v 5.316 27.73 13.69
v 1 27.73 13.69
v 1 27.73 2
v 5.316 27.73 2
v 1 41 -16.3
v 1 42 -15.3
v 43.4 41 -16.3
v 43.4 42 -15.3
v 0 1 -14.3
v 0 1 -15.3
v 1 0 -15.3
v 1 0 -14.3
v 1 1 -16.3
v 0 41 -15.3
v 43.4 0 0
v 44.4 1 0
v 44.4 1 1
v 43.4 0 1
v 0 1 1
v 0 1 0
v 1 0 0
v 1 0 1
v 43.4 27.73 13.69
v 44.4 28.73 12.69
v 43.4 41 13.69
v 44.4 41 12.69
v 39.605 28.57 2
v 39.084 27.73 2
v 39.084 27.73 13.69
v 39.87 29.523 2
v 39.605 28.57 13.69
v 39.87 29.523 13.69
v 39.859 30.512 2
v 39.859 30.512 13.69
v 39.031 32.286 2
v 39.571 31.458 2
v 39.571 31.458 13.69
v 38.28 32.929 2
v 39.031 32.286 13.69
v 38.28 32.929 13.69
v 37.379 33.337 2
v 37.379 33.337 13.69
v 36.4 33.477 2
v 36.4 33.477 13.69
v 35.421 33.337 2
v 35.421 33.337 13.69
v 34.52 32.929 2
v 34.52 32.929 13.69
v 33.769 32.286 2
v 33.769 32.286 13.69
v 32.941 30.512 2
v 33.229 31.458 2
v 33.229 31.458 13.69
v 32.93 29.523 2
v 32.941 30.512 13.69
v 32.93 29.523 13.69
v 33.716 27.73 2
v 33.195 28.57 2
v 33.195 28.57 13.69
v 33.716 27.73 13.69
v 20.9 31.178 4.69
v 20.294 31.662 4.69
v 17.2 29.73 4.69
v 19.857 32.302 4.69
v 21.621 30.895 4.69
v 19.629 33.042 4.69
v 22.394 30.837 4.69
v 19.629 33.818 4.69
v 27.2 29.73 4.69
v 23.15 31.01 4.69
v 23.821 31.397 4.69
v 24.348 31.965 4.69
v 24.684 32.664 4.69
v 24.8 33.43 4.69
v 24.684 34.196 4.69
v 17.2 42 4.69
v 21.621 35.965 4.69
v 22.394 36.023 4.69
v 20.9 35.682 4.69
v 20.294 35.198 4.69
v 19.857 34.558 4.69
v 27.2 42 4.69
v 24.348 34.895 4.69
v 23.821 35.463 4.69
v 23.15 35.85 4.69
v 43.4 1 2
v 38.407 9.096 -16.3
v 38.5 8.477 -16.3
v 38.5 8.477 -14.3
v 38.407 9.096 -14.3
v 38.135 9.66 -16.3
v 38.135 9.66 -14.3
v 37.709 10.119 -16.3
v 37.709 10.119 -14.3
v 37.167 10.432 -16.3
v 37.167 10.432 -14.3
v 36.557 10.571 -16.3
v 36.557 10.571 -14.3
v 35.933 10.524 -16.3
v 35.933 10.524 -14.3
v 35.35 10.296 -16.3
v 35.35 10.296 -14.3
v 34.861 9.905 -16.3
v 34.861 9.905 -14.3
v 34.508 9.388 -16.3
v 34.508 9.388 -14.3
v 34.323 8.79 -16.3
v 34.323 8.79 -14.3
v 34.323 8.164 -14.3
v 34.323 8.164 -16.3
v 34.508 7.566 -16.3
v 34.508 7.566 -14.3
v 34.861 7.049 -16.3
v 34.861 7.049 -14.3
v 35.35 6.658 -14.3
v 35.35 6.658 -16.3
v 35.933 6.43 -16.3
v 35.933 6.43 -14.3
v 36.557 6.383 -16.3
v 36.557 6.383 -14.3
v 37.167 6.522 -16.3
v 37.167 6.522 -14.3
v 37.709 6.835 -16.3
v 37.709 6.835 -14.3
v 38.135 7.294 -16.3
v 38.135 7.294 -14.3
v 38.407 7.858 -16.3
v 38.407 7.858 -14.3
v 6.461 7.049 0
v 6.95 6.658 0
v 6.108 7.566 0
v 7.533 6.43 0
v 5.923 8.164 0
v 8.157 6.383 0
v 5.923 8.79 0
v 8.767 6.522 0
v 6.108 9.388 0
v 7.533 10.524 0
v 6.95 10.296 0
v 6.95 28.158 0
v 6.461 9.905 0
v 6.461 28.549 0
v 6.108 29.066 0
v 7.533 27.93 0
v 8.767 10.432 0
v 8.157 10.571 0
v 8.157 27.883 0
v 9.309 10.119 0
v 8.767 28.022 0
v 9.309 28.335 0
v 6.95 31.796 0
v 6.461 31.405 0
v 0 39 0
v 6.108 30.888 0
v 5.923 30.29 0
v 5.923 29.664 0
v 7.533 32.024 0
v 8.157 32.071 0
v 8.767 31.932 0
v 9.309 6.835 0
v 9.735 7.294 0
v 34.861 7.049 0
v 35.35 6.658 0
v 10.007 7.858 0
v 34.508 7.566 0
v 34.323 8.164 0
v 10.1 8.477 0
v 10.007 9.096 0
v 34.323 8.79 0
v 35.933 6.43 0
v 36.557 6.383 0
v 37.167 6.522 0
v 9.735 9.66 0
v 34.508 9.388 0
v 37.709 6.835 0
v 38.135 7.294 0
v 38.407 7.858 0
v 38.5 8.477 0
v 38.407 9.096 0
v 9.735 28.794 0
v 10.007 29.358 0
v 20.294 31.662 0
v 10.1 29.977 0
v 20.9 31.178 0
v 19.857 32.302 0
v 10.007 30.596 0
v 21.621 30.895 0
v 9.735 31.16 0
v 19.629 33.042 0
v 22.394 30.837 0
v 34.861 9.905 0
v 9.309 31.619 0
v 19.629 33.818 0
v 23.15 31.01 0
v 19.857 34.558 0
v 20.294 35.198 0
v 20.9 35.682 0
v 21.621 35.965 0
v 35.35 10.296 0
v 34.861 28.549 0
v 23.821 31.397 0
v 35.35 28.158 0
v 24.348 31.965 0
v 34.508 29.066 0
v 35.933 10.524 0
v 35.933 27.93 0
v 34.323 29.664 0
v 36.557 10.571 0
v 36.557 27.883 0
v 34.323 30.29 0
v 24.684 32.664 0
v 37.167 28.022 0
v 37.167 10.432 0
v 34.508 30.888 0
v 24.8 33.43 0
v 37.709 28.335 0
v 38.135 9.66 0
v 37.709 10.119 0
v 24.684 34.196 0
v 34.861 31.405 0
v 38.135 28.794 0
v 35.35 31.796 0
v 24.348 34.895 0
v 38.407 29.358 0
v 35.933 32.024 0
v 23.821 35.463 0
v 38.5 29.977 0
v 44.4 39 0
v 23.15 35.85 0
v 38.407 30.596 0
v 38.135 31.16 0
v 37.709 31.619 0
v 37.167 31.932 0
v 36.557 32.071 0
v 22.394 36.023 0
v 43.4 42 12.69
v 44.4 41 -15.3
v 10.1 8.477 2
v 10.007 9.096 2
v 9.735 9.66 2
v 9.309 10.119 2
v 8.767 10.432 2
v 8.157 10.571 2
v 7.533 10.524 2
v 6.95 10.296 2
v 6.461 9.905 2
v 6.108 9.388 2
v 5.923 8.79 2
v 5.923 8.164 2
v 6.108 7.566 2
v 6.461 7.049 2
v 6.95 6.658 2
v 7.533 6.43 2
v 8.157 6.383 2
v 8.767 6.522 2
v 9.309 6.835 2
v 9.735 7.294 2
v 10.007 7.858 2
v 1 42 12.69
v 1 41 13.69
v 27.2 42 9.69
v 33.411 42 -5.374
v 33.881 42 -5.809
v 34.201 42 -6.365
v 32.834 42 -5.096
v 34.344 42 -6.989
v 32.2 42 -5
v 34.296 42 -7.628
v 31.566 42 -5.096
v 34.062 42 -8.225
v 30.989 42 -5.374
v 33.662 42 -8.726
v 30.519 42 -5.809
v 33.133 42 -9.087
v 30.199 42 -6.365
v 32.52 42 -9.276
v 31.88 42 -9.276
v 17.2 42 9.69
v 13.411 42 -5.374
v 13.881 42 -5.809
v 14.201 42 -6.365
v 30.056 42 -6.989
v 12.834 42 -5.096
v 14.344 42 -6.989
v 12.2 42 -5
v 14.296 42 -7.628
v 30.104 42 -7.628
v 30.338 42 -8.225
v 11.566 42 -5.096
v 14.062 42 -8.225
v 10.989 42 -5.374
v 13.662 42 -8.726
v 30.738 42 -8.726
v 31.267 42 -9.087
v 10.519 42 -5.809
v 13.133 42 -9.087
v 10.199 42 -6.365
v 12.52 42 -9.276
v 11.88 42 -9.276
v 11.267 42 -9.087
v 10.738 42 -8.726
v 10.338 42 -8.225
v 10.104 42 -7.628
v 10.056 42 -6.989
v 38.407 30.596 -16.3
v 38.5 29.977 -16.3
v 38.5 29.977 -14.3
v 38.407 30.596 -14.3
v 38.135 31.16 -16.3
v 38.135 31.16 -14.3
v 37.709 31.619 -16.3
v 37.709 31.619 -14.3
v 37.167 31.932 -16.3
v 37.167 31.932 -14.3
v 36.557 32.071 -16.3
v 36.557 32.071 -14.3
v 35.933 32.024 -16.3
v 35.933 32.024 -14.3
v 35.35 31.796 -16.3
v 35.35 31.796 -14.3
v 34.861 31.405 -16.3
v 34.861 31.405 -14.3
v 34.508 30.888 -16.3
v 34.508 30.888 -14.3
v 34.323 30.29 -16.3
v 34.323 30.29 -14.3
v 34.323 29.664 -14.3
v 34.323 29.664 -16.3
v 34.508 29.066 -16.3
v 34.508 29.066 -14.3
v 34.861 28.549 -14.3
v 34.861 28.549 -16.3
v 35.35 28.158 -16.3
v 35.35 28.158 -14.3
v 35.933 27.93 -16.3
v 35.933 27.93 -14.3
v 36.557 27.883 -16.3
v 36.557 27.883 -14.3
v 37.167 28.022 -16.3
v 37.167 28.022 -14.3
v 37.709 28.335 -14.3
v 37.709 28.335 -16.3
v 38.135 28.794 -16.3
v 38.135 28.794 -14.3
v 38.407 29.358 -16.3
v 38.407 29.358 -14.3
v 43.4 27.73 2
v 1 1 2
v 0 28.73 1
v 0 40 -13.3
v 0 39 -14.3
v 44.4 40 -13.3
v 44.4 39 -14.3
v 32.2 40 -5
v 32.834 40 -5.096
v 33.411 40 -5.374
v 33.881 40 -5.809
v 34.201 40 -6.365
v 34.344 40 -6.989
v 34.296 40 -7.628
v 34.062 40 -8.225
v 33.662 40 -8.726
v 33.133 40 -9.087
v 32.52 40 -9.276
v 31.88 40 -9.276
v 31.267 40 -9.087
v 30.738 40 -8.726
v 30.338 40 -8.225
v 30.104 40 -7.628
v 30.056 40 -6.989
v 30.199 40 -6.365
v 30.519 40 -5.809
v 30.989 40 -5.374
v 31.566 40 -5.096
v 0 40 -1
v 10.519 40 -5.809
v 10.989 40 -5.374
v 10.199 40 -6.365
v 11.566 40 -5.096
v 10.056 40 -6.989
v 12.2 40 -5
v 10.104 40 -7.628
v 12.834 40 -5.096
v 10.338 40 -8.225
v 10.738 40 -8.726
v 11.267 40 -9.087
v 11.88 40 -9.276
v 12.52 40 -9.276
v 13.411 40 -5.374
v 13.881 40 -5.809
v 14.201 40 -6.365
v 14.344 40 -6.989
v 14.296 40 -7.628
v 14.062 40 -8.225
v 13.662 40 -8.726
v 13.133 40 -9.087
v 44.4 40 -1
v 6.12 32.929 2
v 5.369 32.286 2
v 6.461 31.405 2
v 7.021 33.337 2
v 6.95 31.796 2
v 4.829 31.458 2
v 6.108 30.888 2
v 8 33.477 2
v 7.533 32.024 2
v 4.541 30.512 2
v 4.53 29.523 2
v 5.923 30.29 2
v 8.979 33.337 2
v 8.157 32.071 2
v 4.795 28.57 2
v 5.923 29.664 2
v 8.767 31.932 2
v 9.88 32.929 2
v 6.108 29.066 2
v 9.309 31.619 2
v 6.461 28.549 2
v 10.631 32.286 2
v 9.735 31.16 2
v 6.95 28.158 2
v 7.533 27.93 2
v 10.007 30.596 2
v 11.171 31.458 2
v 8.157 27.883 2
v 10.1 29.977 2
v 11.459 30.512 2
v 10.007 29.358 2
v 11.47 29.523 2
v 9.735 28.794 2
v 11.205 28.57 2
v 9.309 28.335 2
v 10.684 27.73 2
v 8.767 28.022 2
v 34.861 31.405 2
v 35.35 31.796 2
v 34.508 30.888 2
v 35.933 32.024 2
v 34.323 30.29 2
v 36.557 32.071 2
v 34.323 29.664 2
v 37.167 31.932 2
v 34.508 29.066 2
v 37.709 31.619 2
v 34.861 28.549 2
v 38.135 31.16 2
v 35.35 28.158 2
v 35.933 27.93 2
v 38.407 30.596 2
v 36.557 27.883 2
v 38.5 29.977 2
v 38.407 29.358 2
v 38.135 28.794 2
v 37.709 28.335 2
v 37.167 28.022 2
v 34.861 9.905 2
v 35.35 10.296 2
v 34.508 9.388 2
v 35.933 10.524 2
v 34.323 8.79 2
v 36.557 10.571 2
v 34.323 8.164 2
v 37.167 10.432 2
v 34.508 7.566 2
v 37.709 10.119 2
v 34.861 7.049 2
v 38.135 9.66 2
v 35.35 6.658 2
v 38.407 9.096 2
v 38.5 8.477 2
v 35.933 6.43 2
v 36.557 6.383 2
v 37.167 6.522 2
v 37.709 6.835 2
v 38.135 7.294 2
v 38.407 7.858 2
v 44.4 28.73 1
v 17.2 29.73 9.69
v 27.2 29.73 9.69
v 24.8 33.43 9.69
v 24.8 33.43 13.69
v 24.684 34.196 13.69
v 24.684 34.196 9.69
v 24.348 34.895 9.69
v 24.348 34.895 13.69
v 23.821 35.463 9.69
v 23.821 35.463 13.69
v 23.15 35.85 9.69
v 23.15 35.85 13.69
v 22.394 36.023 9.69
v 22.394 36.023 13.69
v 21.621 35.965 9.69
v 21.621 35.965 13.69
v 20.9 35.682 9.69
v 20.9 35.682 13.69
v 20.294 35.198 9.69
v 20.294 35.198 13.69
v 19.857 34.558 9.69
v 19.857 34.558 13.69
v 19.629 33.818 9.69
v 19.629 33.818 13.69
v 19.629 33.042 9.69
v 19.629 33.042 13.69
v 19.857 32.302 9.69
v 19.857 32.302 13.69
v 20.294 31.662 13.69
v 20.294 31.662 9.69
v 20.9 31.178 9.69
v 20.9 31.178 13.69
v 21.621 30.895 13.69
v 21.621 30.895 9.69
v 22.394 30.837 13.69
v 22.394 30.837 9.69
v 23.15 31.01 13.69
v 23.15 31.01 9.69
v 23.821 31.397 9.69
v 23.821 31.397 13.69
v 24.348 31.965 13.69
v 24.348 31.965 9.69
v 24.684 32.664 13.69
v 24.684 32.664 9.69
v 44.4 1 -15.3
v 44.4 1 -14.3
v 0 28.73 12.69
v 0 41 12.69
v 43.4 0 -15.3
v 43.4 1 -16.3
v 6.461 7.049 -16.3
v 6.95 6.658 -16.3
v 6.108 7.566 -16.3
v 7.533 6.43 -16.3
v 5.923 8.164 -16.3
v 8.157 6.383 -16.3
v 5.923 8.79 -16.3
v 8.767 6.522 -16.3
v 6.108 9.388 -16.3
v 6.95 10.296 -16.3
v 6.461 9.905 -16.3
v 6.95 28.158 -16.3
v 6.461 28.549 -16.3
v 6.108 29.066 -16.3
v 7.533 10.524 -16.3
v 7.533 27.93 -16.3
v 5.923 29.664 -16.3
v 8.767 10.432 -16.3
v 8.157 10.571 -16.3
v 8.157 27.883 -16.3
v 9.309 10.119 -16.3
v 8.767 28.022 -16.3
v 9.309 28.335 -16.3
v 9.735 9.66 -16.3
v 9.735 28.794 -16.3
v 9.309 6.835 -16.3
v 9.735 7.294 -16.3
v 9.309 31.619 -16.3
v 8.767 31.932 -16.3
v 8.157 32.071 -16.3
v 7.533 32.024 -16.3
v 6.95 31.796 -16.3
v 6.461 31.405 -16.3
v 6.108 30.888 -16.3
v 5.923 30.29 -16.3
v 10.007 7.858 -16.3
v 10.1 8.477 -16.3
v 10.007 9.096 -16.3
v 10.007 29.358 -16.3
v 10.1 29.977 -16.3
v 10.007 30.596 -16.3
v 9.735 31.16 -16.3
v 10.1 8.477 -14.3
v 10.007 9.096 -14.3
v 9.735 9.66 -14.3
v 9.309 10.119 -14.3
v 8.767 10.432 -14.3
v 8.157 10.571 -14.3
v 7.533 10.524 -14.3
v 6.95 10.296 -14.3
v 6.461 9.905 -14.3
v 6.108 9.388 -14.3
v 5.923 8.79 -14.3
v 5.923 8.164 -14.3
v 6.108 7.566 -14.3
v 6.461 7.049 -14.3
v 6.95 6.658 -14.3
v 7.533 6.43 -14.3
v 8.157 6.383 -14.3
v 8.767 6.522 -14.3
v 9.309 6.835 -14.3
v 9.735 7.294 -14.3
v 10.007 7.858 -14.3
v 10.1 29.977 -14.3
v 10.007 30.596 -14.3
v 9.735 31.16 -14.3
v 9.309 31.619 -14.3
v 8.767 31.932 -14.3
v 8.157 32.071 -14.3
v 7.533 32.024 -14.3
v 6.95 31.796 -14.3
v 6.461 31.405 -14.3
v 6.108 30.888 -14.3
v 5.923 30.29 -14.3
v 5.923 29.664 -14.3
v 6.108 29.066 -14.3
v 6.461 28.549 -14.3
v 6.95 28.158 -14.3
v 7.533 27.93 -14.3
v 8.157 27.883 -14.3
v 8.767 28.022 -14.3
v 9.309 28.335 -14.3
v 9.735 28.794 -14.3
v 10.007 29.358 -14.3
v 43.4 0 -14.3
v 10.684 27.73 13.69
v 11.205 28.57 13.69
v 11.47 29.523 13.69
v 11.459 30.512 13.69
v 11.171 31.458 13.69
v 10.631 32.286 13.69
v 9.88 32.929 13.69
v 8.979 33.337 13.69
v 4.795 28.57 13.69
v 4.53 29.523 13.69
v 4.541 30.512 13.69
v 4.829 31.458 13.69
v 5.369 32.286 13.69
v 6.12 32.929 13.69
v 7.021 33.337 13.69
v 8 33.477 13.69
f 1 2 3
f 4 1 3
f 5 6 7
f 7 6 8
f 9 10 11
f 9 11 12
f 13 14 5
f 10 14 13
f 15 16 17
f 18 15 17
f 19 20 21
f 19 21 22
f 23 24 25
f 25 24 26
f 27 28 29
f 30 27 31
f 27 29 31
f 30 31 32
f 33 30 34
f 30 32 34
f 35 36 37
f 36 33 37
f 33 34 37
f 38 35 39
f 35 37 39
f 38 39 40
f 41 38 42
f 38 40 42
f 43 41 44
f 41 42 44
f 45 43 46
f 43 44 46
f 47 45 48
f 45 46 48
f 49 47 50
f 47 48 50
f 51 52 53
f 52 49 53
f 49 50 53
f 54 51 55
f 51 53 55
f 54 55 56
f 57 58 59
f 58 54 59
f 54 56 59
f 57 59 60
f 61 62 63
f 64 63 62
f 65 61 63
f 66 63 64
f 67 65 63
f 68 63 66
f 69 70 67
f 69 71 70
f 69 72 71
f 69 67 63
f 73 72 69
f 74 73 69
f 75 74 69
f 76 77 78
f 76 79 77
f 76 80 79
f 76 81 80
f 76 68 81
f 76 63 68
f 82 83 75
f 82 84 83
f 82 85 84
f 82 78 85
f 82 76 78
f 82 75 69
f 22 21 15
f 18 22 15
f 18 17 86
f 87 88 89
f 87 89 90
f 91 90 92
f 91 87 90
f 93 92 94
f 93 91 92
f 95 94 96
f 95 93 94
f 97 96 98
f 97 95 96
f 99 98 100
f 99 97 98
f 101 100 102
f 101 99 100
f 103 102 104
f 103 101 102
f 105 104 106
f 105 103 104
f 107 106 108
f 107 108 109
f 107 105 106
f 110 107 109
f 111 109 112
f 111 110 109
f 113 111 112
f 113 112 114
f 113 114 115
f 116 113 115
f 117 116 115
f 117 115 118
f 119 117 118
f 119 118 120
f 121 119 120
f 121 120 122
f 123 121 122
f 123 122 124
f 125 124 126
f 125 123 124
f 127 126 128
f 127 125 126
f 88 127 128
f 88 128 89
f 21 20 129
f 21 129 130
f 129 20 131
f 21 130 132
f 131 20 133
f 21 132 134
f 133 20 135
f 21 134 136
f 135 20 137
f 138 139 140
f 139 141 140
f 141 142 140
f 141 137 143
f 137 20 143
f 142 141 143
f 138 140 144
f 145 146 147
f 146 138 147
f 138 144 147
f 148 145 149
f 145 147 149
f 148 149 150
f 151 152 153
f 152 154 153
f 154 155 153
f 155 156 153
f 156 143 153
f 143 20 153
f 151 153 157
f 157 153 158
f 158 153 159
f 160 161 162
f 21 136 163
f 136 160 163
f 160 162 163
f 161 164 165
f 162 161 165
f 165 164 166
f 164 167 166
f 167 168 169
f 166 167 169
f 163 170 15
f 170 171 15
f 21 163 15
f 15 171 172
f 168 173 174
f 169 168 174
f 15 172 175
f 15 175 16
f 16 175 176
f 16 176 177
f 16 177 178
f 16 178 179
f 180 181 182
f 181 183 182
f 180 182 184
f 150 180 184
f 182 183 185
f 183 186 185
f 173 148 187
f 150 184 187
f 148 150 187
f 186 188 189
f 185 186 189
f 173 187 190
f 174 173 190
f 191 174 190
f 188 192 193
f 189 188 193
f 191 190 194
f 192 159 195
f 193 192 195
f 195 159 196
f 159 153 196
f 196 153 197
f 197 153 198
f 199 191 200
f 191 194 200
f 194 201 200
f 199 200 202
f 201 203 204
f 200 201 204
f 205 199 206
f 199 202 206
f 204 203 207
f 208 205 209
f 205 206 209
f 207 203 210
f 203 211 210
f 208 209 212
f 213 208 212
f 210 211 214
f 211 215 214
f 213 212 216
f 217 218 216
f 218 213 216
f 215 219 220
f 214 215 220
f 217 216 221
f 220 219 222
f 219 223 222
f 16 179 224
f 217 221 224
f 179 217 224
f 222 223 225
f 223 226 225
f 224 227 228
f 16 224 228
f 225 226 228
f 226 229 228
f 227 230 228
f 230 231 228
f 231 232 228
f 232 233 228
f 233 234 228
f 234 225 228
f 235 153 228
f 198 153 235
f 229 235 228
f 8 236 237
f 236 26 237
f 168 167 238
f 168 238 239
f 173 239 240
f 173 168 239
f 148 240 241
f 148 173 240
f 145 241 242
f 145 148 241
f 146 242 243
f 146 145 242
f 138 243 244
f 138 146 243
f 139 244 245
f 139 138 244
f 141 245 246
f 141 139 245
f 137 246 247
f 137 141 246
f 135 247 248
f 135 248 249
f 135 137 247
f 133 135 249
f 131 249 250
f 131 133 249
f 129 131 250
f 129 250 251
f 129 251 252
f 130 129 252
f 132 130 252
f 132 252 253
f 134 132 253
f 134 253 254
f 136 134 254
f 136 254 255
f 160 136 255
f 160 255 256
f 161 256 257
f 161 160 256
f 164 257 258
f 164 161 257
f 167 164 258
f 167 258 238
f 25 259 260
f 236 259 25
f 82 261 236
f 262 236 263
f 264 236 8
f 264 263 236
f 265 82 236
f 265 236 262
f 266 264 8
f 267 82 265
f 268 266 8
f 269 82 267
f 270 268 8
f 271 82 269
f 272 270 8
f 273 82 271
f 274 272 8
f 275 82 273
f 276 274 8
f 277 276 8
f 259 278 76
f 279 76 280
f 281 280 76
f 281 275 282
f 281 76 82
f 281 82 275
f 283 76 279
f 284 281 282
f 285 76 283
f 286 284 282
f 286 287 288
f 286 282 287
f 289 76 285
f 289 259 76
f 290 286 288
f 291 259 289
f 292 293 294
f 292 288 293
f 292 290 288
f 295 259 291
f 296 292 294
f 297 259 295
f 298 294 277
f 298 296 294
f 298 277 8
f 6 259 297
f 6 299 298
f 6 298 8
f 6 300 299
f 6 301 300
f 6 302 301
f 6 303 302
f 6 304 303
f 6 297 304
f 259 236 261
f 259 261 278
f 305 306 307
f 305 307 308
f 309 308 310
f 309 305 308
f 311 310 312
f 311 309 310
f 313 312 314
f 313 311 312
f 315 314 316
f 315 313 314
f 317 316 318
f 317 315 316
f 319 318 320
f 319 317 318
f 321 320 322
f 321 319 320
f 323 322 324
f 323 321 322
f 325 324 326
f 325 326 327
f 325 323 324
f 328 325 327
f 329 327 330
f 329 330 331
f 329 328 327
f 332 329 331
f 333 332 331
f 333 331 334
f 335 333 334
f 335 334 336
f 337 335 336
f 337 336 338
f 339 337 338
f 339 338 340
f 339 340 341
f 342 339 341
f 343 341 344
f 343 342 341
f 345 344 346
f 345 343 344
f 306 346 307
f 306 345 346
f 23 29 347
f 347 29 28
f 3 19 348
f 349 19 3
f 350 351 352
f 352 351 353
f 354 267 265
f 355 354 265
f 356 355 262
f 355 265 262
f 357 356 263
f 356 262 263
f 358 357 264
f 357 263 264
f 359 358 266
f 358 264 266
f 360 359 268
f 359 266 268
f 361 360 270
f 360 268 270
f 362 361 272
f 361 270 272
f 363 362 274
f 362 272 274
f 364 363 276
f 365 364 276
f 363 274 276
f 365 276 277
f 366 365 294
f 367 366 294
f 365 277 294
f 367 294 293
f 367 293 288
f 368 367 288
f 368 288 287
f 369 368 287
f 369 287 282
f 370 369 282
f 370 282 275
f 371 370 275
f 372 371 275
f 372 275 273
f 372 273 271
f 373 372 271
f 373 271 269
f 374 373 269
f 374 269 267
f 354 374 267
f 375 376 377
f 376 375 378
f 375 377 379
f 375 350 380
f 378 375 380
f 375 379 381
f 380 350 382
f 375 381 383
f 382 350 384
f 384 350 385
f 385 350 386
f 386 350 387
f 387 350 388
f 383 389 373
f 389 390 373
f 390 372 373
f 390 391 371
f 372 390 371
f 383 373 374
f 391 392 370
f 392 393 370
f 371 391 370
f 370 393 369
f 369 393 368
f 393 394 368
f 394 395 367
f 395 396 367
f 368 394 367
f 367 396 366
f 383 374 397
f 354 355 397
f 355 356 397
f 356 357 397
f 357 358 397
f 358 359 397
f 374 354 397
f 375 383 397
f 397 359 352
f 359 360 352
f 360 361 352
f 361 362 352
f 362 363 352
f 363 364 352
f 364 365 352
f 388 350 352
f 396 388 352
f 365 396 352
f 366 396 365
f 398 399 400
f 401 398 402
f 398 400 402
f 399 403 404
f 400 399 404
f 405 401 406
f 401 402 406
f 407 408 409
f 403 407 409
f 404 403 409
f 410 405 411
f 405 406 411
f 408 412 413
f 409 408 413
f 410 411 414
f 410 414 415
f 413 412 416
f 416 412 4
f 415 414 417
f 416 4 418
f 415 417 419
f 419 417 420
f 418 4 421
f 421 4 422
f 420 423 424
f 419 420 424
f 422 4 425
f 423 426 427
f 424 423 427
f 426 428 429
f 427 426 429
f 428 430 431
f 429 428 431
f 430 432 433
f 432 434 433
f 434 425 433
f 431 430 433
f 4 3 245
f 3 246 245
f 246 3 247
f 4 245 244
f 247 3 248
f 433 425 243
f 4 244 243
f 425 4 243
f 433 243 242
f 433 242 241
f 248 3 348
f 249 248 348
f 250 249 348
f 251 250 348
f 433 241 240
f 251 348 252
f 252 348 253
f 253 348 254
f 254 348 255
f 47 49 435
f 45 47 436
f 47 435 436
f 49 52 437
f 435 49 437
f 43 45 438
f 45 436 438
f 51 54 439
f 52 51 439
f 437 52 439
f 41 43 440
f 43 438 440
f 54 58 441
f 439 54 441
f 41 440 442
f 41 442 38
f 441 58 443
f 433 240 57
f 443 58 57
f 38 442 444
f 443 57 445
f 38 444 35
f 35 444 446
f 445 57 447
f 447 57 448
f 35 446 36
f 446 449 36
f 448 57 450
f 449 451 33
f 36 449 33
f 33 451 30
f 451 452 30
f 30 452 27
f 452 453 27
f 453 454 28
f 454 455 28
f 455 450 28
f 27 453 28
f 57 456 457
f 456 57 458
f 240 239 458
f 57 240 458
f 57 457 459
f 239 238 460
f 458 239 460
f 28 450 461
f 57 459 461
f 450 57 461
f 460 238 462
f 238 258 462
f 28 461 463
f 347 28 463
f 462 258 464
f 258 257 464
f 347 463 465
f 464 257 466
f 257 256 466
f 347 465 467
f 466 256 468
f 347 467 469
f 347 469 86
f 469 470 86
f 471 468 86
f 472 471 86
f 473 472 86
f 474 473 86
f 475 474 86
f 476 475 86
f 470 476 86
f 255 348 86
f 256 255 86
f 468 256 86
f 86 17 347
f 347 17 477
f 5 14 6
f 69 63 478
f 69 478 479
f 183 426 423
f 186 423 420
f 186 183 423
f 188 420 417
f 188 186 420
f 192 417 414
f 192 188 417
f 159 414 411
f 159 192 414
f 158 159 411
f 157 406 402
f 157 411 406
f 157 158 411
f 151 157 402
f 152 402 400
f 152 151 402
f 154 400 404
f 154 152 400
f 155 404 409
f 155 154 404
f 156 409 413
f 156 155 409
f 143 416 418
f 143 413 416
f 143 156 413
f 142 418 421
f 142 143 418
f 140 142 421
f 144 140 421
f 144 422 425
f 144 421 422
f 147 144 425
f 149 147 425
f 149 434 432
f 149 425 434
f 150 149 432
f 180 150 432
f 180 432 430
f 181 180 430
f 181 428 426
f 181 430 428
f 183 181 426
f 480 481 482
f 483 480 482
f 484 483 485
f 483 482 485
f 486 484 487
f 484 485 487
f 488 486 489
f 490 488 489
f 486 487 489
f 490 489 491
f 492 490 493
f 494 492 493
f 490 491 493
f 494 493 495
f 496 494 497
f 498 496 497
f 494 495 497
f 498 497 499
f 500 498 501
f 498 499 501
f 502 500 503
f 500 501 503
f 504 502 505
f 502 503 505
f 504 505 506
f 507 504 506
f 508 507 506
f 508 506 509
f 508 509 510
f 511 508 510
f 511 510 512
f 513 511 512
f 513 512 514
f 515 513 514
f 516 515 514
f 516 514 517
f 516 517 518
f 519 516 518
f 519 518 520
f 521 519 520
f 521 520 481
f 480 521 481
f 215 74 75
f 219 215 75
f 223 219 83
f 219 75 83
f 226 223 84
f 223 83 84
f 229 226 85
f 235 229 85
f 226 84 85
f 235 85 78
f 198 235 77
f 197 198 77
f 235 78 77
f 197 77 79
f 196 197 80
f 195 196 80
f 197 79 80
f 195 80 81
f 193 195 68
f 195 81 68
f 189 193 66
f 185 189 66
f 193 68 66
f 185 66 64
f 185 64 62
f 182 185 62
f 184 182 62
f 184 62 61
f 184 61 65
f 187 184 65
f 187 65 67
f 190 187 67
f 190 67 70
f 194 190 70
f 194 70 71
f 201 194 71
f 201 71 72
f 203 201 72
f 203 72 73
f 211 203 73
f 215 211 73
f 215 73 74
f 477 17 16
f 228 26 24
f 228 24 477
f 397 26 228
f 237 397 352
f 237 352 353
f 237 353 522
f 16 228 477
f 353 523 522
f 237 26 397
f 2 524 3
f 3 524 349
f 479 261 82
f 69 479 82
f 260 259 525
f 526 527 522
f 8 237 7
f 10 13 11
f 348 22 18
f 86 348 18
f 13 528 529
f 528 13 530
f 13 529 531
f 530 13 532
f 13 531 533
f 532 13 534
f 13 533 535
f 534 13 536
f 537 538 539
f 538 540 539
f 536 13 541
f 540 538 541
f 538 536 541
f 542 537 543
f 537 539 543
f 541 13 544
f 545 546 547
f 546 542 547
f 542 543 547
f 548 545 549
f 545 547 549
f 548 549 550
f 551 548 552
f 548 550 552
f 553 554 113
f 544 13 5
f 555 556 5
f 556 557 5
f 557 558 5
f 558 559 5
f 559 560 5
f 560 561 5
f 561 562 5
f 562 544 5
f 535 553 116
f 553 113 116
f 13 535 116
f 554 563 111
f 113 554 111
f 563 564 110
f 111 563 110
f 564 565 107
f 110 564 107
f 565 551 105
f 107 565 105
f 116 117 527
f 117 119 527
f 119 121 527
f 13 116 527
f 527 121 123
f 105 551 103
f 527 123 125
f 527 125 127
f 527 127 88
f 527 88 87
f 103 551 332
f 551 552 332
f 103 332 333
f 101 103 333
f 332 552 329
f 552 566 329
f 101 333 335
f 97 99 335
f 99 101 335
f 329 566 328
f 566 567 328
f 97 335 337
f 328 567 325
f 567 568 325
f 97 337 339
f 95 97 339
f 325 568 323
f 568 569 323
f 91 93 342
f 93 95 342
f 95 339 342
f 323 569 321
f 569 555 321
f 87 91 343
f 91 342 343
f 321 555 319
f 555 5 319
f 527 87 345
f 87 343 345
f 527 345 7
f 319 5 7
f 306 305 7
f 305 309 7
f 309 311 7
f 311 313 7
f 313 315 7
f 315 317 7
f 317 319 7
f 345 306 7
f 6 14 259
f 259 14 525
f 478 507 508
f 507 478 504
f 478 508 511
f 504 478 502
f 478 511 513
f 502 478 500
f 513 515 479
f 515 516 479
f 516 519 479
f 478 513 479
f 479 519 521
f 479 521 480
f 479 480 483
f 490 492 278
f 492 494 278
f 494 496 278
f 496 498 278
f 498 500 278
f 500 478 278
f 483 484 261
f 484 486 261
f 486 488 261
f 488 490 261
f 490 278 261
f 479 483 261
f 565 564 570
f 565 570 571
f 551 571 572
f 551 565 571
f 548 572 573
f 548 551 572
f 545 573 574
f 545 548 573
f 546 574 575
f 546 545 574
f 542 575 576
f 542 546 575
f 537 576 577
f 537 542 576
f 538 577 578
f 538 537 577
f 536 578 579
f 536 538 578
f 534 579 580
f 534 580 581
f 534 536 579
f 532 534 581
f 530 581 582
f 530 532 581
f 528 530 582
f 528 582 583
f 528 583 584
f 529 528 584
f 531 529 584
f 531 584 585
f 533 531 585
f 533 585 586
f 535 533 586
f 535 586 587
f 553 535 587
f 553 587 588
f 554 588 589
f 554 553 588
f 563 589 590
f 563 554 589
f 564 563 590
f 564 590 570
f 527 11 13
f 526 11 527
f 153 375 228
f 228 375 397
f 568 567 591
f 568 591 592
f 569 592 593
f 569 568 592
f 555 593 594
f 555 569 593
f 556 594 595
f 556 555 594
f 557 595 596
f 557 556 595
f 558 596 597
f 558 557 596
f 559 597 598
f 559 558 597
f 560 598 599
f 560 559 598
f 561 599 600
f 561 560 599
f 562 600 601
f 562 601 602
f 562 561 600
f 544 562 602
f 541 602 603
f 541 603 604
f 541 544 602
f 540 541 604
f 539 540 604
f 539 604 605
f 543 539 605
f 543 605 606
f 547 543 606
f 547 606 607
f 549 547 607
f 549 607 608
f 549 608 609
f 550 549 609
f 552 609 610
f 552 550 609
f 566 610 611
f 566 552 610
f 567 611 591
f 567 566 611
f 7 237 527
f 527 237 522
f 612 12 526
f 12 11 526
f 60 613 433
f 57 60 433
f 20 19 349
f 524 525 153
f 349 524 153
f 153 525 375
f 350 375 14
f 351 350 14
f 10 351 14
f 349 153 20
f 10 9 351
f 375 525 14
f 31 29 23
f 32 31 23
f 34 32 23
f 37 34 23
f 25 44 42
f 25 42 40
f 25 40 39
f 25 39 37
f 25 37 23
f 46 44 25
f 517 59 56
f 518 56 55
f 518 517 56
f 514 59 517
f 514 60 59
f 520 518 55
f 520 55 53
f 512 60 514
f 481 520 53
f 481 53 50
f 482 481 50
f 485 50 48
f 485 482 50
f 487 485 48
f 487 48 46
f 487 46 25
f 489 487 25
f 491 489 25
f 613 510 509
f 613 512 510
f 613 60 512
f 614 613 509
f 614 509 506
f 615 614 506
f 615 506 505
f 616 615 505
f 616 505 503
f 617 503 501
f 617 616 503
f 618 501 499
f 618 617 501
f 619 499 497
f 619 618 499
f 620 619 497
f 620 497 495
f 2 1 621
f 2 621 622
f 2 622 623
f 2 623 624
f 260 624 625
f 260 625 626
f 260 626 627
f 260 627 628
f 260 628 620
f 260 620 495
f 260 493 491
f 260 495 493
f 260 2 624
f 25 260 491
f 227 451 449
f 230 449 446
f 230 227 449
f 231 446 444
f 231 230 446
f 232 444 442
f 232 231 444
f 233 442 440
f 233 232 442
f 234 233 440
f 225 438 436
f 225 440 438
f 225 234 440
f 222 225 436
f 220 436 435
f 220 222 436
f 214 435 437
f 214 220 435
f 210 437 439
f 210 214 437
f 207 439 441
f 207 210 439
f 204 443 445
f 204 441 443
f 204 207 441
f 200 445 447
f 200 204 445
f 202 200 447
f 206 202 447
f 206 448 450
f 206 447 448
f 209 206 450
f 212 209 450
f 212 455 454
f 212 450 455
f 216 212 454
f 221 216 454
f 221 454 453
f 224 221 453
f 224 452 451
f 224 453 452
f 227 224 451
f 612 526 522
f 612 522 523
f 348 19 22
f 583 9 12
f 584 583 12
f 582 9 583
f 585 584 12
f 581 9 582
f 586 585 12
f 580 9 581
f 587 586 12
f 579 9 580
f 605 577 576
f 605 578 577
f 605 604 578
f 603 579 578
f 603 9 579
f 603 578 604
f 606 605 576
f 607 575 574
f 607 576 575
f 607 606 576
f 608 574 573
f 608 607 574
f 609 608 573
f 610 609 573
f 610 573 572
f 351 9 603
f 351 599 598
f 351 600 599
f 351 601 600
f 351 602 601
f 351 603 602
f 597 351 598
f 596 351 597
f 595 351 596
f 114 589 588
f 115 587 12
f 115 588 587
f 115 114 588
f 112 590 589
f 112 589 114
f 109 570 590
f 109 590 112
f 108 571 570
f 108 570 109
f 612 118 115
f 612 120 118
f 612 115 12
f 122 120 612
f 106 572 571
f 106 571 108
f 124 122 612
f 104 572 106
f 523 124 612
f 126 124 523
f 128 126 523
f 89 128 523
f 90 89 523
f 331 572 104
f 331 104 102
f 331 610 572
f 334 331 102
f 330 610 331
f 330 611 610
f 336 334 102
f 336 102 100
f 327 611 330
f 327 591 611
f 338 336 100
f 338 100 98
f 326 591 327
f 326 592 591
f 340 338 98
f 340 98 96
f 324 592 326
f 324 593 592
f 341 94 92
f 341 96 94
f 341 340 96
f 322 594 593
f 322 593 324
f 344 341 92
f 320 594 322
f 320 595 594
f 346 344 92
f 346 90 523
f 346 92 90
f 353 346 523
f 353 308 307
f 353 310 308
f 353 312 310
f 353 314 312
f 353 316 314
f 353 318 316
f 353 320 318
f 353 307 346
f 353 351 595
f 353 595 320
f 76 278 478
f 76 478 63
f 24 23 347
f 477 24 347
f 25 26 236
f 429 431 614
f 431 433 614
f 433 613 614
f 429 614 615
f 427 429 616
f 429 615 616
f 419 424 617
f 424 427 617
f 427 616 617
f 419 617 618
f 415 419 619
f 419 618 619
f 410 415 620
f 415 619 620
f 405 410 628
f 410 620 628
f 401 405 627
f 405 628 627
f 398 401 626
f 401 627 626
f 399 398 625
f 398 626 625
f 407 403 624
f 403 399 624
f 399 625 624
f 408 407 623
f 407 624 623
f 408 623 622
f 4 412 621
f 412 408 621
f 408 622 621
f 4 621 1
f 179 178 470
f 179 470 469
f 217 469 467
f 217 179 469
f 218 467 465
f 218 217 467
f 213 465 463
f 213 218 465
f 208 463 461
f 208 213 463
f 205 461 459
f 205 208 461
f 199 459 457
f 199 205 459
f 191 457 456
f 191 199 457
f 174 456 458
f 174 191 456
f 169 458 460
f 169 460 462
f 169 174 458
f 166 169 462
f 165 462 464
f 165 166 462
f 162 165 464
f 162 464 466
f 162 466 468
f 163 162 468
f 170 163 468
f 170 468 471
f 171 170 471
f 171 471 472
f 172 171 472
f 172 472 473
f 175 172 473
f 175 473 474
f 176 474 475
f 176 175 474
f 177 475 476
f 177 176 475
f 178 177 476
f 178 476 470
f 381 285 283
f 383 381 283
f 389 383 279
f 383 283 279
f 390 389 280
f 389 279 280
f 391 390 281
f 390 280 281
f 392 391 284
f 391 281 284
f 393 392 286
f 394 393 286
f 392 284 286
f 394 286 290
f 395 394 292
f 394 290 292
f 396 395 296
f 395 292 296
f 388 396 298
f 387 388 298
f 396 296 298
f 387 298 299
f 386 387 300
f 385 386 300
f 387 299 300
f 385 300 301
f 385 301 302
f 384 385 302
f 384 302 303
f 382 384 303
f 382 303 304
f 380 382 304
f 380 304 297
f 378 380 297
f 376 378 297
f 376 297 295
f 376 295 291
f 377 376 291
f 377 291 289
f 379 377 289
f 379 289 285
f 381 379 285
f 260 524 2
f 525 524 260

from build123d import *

# Parameters (mm, degrees)
SKETCH1_W           = 44.4
SKETCH1_H           = 40
SKETCH1_R           = 2.1
BOSS_EXTRUDE1_DEPTH = 2
SKETCH2_W           = 44.4
SKETCH2_H           = 18.3
BOSS_EXTRUDE2_DEPTH = 2
LPATTERN1_COUNT     = 2
LPATTERN1_PITCH     = 16.3
SKETCH3_R           = 2.15
CUT_EXTRUDE1_DEPTH  = 64.253853638
BOSS_EXTRUDE3_START = -22.2
SKETCH6_W           = 11.69
SKETCH6_H           = 14.27
BOSS_EXTRUDE3_DEPTH = 44.4
CUT_EXTRUDE2_REACH  = 70.079
SKETCH7_R           = 2.6
CUT_EXTRUDE3_REACH  = 65.254
SKETCH8_R           = 2.1
SKETCH9_R           = 3.5
CUT_EXTRUDE4_DEPTH  = 11.69
FILLET4_SIZE        = 1
SKETCH11_W          = 10
SKETCH11_H          = 5
CUT_EXTRUDE6_DEPTH  = 12.27


with BuildPart() as part:
    # Sketch1 → Boss-Extrude1 (new body)
    with BuildSketch(Plane.XY):
        with Locations((22.2, 20)):
            Rectangle(SKETCH1_W, SKETCH1_H)
        with Locations((8, 8.476902454)):
            Circle(SKETCH1_R, mode=Mode.SUBTRACT)
        with Locations((8, 29.976902454)):
            Circle(SKETCH1_R, mode=Mode.SUBTRACT)
        with Locations((36.4, 29.976902454)):
            Circle(SKETCH1_R, mode=Mode.SUBTRACT)
        with Locations((36.4, 8.476902454)):
            Circle(SKETCH1_R, mode=Mode.SUBTRACT)
    boss_extrude1 = extrude(amount=BOSS_EXTRUDE1_DEPTH)

    # Sketch2 → Boss-Extrude2 (add)
    with BuildSketch(Plane(origin=(0, 40, 0), x_dir=(1, 0, 0), z_dir=(0, 1, 0))):
        with Locations((22.2, 7.15)):
            Rectangle(SKETCH2_W, SKETCH2_H)
    extrude(amount=BOSS_EXTRUDE2_DEPTH)

    # LPattern1: Boss-Extrude1 ×2
    with Locations(*[(0, 0, -i * LPATTERN1_PITCH) for i in range(1, LPATTERN1_COUNT)]):
        add(boss_extrude1)

    # Sketch3 → Cut-Extrude1 (cut, through all)
    with BuildSketch(Plane(origin=(0, 42, 0), x_dir=(1, 0, 0), z_dir=(0, 1, 0))):
        with Locations(Location((12.2, 7.15, 0), (0, 0, 270))):
            Circle(SKETCH3_R)
        with Locations(Location((32.2, 7.15, 0), (0, 0, 270))):
            Circle(SKETCH3_R)
    extrude(amount=-CUT_EXTRUDE1_DEPTH, mode=Mode.SUBTRACT)

    # Sketch6 → Boss-Extrude3 (add)
    with BuildSketch(Plane(origin=(22.2, 0, 0), x_dir=(0, 0, -1), z_dir=(1, 0, 0)).offset(BOSS_EXTRUDE3_START)):
        with Locations((-7.845, 34.865)):
            Rectangle(SKETCH6_W, SKETCH6_H)
    extrude(amount=BOSS_EXTRUDE3_DEPTH)

    # Sketch7 → Cut-Extrude2 (cut, up to next)
    with BuildSketch(Plane.XY.offset(13.69), mode=Mode.PRIVATE) as cut_extrude2_sk1:
        with Locations((22.2, 33.43)):
            Circle(SKETCH7_R)
    cut_extrude2_tool1 = extrude(cut_extrude2_sk1.sketch, amount=-CUT_EXTRUDE2_REACH, mode=Mode.PRIVATE) & part.part
    add(cut_extrude2_tool1.solids().sort_by_distance((22.2, 33.43, 13.69))[0], mode=Mode.SUBTRACT)

    # Sketch8 → Cut-Extrude3 (cut, up to next)
    with BuildSketch(Plane(origin=(0, 0, 0), x_dir=(-1, 0, 0), z_dir=(0, 0, -1)), mode=Mode.PRIVATE) as cut_extrude3_sk1:
        with Locations(Location((-36.4, 29.976902454, 0), (0, 0, 90))):
            Circle(SKETCH8_R)
    cut_extrude3_tool1 = extrude(cut_extrude3_sk1.sketch, amount=-CUT_EXTRUDE3_REACH, mode=Mode.PRIVATE) & part.part
    # Sketch8 → Cut-Extrude3 (cut, up to next)
    with BuildSketch(Plane(origin=(0, 0, 0), x_dir=(-1, 0, 0), z_dir=(0, 0, -1)), mode=Mode.PRIVATE) as cut_extrude3_sk2:
        with Locations(Location((-8, 29.976902454, 0), (0, 0, 90))):
            Circle(SKETCH8_R)
    cut_extrude3_tool2 = extrude(cut_extrude3_sk2.sketch, amount=-CUT_EXTRUDE3_REACH, mode=Mode.PRIVATE) & part.part
    add(cut_extrude3_tool1.solids().sort_by_distance((36.4, 29.976902, 0))[0], mode=Mode.SUBTRACT)
    add(cut_extrude3_tool2.solids().sort_by_distance((8, 29.976902, 0))[0], mode=Mode.SUBTRACT)

    # Sketch9 → Cut-Extrude4 (cut)
    with BuildSketch(Plane.XY.offset(13.69)):
        with Locations((8, 29.976902454)):
            Circle(SKETCH9_R)
        with Locations((36.4, 29.976902454)):
            Circle(SKETCH9_R)
    extrude(amount=-CUT_EXTRUDE4_DEPTH, mode=Mode.SUBTRACT)

    # Fillet4
    fillet4_edges = [part.edges().sort_by_distance(p)[0] for p in [
        (44.4, 13.865, 2),
        (0, 21, -16.3),
        (44.4, 21, -16.3),
        (0, 42, -1.305),
        (44.4, 42, -1.305),
        (22.2, 42, -16.3),
        (22.2, 40, -14.3),
        (22.2, 0, -16.3),
        (0, 0, -15.3),
        (44.4, 0, -15.3),
        (22.2, 40, 0),
        (0, 13.865, 2),
        (44.4, 27.73, 7.845),
        (44.4, 34.865, 13.69),
        (22.2, 42, 13.69),
        (0, 27.73, 7.845),
        (0, 34.865, 13.69),
        (44.4, 0, 1),
        (0, 0, 1),
        (22.2, 0, 2),
    ]]
    chamfer(fillet4_edges, length=FILLET4_SIZE)

    # Sketch11 → Cut-Extrude6 (cut)
    with BuildSketch(Plane(origin=(0, 42, 0), x_dir=(1, 0, 0), z_dir=(0, 1, 0))):
        with Locations((22.2, -7.19)):
            Rectangle(SKETCH11_W, SKETCH11_H)
    extrude(amount=-CUT_EXTRUDE6_DEPTH, mode=Mode.SUBTRACT)


solid = part.part
